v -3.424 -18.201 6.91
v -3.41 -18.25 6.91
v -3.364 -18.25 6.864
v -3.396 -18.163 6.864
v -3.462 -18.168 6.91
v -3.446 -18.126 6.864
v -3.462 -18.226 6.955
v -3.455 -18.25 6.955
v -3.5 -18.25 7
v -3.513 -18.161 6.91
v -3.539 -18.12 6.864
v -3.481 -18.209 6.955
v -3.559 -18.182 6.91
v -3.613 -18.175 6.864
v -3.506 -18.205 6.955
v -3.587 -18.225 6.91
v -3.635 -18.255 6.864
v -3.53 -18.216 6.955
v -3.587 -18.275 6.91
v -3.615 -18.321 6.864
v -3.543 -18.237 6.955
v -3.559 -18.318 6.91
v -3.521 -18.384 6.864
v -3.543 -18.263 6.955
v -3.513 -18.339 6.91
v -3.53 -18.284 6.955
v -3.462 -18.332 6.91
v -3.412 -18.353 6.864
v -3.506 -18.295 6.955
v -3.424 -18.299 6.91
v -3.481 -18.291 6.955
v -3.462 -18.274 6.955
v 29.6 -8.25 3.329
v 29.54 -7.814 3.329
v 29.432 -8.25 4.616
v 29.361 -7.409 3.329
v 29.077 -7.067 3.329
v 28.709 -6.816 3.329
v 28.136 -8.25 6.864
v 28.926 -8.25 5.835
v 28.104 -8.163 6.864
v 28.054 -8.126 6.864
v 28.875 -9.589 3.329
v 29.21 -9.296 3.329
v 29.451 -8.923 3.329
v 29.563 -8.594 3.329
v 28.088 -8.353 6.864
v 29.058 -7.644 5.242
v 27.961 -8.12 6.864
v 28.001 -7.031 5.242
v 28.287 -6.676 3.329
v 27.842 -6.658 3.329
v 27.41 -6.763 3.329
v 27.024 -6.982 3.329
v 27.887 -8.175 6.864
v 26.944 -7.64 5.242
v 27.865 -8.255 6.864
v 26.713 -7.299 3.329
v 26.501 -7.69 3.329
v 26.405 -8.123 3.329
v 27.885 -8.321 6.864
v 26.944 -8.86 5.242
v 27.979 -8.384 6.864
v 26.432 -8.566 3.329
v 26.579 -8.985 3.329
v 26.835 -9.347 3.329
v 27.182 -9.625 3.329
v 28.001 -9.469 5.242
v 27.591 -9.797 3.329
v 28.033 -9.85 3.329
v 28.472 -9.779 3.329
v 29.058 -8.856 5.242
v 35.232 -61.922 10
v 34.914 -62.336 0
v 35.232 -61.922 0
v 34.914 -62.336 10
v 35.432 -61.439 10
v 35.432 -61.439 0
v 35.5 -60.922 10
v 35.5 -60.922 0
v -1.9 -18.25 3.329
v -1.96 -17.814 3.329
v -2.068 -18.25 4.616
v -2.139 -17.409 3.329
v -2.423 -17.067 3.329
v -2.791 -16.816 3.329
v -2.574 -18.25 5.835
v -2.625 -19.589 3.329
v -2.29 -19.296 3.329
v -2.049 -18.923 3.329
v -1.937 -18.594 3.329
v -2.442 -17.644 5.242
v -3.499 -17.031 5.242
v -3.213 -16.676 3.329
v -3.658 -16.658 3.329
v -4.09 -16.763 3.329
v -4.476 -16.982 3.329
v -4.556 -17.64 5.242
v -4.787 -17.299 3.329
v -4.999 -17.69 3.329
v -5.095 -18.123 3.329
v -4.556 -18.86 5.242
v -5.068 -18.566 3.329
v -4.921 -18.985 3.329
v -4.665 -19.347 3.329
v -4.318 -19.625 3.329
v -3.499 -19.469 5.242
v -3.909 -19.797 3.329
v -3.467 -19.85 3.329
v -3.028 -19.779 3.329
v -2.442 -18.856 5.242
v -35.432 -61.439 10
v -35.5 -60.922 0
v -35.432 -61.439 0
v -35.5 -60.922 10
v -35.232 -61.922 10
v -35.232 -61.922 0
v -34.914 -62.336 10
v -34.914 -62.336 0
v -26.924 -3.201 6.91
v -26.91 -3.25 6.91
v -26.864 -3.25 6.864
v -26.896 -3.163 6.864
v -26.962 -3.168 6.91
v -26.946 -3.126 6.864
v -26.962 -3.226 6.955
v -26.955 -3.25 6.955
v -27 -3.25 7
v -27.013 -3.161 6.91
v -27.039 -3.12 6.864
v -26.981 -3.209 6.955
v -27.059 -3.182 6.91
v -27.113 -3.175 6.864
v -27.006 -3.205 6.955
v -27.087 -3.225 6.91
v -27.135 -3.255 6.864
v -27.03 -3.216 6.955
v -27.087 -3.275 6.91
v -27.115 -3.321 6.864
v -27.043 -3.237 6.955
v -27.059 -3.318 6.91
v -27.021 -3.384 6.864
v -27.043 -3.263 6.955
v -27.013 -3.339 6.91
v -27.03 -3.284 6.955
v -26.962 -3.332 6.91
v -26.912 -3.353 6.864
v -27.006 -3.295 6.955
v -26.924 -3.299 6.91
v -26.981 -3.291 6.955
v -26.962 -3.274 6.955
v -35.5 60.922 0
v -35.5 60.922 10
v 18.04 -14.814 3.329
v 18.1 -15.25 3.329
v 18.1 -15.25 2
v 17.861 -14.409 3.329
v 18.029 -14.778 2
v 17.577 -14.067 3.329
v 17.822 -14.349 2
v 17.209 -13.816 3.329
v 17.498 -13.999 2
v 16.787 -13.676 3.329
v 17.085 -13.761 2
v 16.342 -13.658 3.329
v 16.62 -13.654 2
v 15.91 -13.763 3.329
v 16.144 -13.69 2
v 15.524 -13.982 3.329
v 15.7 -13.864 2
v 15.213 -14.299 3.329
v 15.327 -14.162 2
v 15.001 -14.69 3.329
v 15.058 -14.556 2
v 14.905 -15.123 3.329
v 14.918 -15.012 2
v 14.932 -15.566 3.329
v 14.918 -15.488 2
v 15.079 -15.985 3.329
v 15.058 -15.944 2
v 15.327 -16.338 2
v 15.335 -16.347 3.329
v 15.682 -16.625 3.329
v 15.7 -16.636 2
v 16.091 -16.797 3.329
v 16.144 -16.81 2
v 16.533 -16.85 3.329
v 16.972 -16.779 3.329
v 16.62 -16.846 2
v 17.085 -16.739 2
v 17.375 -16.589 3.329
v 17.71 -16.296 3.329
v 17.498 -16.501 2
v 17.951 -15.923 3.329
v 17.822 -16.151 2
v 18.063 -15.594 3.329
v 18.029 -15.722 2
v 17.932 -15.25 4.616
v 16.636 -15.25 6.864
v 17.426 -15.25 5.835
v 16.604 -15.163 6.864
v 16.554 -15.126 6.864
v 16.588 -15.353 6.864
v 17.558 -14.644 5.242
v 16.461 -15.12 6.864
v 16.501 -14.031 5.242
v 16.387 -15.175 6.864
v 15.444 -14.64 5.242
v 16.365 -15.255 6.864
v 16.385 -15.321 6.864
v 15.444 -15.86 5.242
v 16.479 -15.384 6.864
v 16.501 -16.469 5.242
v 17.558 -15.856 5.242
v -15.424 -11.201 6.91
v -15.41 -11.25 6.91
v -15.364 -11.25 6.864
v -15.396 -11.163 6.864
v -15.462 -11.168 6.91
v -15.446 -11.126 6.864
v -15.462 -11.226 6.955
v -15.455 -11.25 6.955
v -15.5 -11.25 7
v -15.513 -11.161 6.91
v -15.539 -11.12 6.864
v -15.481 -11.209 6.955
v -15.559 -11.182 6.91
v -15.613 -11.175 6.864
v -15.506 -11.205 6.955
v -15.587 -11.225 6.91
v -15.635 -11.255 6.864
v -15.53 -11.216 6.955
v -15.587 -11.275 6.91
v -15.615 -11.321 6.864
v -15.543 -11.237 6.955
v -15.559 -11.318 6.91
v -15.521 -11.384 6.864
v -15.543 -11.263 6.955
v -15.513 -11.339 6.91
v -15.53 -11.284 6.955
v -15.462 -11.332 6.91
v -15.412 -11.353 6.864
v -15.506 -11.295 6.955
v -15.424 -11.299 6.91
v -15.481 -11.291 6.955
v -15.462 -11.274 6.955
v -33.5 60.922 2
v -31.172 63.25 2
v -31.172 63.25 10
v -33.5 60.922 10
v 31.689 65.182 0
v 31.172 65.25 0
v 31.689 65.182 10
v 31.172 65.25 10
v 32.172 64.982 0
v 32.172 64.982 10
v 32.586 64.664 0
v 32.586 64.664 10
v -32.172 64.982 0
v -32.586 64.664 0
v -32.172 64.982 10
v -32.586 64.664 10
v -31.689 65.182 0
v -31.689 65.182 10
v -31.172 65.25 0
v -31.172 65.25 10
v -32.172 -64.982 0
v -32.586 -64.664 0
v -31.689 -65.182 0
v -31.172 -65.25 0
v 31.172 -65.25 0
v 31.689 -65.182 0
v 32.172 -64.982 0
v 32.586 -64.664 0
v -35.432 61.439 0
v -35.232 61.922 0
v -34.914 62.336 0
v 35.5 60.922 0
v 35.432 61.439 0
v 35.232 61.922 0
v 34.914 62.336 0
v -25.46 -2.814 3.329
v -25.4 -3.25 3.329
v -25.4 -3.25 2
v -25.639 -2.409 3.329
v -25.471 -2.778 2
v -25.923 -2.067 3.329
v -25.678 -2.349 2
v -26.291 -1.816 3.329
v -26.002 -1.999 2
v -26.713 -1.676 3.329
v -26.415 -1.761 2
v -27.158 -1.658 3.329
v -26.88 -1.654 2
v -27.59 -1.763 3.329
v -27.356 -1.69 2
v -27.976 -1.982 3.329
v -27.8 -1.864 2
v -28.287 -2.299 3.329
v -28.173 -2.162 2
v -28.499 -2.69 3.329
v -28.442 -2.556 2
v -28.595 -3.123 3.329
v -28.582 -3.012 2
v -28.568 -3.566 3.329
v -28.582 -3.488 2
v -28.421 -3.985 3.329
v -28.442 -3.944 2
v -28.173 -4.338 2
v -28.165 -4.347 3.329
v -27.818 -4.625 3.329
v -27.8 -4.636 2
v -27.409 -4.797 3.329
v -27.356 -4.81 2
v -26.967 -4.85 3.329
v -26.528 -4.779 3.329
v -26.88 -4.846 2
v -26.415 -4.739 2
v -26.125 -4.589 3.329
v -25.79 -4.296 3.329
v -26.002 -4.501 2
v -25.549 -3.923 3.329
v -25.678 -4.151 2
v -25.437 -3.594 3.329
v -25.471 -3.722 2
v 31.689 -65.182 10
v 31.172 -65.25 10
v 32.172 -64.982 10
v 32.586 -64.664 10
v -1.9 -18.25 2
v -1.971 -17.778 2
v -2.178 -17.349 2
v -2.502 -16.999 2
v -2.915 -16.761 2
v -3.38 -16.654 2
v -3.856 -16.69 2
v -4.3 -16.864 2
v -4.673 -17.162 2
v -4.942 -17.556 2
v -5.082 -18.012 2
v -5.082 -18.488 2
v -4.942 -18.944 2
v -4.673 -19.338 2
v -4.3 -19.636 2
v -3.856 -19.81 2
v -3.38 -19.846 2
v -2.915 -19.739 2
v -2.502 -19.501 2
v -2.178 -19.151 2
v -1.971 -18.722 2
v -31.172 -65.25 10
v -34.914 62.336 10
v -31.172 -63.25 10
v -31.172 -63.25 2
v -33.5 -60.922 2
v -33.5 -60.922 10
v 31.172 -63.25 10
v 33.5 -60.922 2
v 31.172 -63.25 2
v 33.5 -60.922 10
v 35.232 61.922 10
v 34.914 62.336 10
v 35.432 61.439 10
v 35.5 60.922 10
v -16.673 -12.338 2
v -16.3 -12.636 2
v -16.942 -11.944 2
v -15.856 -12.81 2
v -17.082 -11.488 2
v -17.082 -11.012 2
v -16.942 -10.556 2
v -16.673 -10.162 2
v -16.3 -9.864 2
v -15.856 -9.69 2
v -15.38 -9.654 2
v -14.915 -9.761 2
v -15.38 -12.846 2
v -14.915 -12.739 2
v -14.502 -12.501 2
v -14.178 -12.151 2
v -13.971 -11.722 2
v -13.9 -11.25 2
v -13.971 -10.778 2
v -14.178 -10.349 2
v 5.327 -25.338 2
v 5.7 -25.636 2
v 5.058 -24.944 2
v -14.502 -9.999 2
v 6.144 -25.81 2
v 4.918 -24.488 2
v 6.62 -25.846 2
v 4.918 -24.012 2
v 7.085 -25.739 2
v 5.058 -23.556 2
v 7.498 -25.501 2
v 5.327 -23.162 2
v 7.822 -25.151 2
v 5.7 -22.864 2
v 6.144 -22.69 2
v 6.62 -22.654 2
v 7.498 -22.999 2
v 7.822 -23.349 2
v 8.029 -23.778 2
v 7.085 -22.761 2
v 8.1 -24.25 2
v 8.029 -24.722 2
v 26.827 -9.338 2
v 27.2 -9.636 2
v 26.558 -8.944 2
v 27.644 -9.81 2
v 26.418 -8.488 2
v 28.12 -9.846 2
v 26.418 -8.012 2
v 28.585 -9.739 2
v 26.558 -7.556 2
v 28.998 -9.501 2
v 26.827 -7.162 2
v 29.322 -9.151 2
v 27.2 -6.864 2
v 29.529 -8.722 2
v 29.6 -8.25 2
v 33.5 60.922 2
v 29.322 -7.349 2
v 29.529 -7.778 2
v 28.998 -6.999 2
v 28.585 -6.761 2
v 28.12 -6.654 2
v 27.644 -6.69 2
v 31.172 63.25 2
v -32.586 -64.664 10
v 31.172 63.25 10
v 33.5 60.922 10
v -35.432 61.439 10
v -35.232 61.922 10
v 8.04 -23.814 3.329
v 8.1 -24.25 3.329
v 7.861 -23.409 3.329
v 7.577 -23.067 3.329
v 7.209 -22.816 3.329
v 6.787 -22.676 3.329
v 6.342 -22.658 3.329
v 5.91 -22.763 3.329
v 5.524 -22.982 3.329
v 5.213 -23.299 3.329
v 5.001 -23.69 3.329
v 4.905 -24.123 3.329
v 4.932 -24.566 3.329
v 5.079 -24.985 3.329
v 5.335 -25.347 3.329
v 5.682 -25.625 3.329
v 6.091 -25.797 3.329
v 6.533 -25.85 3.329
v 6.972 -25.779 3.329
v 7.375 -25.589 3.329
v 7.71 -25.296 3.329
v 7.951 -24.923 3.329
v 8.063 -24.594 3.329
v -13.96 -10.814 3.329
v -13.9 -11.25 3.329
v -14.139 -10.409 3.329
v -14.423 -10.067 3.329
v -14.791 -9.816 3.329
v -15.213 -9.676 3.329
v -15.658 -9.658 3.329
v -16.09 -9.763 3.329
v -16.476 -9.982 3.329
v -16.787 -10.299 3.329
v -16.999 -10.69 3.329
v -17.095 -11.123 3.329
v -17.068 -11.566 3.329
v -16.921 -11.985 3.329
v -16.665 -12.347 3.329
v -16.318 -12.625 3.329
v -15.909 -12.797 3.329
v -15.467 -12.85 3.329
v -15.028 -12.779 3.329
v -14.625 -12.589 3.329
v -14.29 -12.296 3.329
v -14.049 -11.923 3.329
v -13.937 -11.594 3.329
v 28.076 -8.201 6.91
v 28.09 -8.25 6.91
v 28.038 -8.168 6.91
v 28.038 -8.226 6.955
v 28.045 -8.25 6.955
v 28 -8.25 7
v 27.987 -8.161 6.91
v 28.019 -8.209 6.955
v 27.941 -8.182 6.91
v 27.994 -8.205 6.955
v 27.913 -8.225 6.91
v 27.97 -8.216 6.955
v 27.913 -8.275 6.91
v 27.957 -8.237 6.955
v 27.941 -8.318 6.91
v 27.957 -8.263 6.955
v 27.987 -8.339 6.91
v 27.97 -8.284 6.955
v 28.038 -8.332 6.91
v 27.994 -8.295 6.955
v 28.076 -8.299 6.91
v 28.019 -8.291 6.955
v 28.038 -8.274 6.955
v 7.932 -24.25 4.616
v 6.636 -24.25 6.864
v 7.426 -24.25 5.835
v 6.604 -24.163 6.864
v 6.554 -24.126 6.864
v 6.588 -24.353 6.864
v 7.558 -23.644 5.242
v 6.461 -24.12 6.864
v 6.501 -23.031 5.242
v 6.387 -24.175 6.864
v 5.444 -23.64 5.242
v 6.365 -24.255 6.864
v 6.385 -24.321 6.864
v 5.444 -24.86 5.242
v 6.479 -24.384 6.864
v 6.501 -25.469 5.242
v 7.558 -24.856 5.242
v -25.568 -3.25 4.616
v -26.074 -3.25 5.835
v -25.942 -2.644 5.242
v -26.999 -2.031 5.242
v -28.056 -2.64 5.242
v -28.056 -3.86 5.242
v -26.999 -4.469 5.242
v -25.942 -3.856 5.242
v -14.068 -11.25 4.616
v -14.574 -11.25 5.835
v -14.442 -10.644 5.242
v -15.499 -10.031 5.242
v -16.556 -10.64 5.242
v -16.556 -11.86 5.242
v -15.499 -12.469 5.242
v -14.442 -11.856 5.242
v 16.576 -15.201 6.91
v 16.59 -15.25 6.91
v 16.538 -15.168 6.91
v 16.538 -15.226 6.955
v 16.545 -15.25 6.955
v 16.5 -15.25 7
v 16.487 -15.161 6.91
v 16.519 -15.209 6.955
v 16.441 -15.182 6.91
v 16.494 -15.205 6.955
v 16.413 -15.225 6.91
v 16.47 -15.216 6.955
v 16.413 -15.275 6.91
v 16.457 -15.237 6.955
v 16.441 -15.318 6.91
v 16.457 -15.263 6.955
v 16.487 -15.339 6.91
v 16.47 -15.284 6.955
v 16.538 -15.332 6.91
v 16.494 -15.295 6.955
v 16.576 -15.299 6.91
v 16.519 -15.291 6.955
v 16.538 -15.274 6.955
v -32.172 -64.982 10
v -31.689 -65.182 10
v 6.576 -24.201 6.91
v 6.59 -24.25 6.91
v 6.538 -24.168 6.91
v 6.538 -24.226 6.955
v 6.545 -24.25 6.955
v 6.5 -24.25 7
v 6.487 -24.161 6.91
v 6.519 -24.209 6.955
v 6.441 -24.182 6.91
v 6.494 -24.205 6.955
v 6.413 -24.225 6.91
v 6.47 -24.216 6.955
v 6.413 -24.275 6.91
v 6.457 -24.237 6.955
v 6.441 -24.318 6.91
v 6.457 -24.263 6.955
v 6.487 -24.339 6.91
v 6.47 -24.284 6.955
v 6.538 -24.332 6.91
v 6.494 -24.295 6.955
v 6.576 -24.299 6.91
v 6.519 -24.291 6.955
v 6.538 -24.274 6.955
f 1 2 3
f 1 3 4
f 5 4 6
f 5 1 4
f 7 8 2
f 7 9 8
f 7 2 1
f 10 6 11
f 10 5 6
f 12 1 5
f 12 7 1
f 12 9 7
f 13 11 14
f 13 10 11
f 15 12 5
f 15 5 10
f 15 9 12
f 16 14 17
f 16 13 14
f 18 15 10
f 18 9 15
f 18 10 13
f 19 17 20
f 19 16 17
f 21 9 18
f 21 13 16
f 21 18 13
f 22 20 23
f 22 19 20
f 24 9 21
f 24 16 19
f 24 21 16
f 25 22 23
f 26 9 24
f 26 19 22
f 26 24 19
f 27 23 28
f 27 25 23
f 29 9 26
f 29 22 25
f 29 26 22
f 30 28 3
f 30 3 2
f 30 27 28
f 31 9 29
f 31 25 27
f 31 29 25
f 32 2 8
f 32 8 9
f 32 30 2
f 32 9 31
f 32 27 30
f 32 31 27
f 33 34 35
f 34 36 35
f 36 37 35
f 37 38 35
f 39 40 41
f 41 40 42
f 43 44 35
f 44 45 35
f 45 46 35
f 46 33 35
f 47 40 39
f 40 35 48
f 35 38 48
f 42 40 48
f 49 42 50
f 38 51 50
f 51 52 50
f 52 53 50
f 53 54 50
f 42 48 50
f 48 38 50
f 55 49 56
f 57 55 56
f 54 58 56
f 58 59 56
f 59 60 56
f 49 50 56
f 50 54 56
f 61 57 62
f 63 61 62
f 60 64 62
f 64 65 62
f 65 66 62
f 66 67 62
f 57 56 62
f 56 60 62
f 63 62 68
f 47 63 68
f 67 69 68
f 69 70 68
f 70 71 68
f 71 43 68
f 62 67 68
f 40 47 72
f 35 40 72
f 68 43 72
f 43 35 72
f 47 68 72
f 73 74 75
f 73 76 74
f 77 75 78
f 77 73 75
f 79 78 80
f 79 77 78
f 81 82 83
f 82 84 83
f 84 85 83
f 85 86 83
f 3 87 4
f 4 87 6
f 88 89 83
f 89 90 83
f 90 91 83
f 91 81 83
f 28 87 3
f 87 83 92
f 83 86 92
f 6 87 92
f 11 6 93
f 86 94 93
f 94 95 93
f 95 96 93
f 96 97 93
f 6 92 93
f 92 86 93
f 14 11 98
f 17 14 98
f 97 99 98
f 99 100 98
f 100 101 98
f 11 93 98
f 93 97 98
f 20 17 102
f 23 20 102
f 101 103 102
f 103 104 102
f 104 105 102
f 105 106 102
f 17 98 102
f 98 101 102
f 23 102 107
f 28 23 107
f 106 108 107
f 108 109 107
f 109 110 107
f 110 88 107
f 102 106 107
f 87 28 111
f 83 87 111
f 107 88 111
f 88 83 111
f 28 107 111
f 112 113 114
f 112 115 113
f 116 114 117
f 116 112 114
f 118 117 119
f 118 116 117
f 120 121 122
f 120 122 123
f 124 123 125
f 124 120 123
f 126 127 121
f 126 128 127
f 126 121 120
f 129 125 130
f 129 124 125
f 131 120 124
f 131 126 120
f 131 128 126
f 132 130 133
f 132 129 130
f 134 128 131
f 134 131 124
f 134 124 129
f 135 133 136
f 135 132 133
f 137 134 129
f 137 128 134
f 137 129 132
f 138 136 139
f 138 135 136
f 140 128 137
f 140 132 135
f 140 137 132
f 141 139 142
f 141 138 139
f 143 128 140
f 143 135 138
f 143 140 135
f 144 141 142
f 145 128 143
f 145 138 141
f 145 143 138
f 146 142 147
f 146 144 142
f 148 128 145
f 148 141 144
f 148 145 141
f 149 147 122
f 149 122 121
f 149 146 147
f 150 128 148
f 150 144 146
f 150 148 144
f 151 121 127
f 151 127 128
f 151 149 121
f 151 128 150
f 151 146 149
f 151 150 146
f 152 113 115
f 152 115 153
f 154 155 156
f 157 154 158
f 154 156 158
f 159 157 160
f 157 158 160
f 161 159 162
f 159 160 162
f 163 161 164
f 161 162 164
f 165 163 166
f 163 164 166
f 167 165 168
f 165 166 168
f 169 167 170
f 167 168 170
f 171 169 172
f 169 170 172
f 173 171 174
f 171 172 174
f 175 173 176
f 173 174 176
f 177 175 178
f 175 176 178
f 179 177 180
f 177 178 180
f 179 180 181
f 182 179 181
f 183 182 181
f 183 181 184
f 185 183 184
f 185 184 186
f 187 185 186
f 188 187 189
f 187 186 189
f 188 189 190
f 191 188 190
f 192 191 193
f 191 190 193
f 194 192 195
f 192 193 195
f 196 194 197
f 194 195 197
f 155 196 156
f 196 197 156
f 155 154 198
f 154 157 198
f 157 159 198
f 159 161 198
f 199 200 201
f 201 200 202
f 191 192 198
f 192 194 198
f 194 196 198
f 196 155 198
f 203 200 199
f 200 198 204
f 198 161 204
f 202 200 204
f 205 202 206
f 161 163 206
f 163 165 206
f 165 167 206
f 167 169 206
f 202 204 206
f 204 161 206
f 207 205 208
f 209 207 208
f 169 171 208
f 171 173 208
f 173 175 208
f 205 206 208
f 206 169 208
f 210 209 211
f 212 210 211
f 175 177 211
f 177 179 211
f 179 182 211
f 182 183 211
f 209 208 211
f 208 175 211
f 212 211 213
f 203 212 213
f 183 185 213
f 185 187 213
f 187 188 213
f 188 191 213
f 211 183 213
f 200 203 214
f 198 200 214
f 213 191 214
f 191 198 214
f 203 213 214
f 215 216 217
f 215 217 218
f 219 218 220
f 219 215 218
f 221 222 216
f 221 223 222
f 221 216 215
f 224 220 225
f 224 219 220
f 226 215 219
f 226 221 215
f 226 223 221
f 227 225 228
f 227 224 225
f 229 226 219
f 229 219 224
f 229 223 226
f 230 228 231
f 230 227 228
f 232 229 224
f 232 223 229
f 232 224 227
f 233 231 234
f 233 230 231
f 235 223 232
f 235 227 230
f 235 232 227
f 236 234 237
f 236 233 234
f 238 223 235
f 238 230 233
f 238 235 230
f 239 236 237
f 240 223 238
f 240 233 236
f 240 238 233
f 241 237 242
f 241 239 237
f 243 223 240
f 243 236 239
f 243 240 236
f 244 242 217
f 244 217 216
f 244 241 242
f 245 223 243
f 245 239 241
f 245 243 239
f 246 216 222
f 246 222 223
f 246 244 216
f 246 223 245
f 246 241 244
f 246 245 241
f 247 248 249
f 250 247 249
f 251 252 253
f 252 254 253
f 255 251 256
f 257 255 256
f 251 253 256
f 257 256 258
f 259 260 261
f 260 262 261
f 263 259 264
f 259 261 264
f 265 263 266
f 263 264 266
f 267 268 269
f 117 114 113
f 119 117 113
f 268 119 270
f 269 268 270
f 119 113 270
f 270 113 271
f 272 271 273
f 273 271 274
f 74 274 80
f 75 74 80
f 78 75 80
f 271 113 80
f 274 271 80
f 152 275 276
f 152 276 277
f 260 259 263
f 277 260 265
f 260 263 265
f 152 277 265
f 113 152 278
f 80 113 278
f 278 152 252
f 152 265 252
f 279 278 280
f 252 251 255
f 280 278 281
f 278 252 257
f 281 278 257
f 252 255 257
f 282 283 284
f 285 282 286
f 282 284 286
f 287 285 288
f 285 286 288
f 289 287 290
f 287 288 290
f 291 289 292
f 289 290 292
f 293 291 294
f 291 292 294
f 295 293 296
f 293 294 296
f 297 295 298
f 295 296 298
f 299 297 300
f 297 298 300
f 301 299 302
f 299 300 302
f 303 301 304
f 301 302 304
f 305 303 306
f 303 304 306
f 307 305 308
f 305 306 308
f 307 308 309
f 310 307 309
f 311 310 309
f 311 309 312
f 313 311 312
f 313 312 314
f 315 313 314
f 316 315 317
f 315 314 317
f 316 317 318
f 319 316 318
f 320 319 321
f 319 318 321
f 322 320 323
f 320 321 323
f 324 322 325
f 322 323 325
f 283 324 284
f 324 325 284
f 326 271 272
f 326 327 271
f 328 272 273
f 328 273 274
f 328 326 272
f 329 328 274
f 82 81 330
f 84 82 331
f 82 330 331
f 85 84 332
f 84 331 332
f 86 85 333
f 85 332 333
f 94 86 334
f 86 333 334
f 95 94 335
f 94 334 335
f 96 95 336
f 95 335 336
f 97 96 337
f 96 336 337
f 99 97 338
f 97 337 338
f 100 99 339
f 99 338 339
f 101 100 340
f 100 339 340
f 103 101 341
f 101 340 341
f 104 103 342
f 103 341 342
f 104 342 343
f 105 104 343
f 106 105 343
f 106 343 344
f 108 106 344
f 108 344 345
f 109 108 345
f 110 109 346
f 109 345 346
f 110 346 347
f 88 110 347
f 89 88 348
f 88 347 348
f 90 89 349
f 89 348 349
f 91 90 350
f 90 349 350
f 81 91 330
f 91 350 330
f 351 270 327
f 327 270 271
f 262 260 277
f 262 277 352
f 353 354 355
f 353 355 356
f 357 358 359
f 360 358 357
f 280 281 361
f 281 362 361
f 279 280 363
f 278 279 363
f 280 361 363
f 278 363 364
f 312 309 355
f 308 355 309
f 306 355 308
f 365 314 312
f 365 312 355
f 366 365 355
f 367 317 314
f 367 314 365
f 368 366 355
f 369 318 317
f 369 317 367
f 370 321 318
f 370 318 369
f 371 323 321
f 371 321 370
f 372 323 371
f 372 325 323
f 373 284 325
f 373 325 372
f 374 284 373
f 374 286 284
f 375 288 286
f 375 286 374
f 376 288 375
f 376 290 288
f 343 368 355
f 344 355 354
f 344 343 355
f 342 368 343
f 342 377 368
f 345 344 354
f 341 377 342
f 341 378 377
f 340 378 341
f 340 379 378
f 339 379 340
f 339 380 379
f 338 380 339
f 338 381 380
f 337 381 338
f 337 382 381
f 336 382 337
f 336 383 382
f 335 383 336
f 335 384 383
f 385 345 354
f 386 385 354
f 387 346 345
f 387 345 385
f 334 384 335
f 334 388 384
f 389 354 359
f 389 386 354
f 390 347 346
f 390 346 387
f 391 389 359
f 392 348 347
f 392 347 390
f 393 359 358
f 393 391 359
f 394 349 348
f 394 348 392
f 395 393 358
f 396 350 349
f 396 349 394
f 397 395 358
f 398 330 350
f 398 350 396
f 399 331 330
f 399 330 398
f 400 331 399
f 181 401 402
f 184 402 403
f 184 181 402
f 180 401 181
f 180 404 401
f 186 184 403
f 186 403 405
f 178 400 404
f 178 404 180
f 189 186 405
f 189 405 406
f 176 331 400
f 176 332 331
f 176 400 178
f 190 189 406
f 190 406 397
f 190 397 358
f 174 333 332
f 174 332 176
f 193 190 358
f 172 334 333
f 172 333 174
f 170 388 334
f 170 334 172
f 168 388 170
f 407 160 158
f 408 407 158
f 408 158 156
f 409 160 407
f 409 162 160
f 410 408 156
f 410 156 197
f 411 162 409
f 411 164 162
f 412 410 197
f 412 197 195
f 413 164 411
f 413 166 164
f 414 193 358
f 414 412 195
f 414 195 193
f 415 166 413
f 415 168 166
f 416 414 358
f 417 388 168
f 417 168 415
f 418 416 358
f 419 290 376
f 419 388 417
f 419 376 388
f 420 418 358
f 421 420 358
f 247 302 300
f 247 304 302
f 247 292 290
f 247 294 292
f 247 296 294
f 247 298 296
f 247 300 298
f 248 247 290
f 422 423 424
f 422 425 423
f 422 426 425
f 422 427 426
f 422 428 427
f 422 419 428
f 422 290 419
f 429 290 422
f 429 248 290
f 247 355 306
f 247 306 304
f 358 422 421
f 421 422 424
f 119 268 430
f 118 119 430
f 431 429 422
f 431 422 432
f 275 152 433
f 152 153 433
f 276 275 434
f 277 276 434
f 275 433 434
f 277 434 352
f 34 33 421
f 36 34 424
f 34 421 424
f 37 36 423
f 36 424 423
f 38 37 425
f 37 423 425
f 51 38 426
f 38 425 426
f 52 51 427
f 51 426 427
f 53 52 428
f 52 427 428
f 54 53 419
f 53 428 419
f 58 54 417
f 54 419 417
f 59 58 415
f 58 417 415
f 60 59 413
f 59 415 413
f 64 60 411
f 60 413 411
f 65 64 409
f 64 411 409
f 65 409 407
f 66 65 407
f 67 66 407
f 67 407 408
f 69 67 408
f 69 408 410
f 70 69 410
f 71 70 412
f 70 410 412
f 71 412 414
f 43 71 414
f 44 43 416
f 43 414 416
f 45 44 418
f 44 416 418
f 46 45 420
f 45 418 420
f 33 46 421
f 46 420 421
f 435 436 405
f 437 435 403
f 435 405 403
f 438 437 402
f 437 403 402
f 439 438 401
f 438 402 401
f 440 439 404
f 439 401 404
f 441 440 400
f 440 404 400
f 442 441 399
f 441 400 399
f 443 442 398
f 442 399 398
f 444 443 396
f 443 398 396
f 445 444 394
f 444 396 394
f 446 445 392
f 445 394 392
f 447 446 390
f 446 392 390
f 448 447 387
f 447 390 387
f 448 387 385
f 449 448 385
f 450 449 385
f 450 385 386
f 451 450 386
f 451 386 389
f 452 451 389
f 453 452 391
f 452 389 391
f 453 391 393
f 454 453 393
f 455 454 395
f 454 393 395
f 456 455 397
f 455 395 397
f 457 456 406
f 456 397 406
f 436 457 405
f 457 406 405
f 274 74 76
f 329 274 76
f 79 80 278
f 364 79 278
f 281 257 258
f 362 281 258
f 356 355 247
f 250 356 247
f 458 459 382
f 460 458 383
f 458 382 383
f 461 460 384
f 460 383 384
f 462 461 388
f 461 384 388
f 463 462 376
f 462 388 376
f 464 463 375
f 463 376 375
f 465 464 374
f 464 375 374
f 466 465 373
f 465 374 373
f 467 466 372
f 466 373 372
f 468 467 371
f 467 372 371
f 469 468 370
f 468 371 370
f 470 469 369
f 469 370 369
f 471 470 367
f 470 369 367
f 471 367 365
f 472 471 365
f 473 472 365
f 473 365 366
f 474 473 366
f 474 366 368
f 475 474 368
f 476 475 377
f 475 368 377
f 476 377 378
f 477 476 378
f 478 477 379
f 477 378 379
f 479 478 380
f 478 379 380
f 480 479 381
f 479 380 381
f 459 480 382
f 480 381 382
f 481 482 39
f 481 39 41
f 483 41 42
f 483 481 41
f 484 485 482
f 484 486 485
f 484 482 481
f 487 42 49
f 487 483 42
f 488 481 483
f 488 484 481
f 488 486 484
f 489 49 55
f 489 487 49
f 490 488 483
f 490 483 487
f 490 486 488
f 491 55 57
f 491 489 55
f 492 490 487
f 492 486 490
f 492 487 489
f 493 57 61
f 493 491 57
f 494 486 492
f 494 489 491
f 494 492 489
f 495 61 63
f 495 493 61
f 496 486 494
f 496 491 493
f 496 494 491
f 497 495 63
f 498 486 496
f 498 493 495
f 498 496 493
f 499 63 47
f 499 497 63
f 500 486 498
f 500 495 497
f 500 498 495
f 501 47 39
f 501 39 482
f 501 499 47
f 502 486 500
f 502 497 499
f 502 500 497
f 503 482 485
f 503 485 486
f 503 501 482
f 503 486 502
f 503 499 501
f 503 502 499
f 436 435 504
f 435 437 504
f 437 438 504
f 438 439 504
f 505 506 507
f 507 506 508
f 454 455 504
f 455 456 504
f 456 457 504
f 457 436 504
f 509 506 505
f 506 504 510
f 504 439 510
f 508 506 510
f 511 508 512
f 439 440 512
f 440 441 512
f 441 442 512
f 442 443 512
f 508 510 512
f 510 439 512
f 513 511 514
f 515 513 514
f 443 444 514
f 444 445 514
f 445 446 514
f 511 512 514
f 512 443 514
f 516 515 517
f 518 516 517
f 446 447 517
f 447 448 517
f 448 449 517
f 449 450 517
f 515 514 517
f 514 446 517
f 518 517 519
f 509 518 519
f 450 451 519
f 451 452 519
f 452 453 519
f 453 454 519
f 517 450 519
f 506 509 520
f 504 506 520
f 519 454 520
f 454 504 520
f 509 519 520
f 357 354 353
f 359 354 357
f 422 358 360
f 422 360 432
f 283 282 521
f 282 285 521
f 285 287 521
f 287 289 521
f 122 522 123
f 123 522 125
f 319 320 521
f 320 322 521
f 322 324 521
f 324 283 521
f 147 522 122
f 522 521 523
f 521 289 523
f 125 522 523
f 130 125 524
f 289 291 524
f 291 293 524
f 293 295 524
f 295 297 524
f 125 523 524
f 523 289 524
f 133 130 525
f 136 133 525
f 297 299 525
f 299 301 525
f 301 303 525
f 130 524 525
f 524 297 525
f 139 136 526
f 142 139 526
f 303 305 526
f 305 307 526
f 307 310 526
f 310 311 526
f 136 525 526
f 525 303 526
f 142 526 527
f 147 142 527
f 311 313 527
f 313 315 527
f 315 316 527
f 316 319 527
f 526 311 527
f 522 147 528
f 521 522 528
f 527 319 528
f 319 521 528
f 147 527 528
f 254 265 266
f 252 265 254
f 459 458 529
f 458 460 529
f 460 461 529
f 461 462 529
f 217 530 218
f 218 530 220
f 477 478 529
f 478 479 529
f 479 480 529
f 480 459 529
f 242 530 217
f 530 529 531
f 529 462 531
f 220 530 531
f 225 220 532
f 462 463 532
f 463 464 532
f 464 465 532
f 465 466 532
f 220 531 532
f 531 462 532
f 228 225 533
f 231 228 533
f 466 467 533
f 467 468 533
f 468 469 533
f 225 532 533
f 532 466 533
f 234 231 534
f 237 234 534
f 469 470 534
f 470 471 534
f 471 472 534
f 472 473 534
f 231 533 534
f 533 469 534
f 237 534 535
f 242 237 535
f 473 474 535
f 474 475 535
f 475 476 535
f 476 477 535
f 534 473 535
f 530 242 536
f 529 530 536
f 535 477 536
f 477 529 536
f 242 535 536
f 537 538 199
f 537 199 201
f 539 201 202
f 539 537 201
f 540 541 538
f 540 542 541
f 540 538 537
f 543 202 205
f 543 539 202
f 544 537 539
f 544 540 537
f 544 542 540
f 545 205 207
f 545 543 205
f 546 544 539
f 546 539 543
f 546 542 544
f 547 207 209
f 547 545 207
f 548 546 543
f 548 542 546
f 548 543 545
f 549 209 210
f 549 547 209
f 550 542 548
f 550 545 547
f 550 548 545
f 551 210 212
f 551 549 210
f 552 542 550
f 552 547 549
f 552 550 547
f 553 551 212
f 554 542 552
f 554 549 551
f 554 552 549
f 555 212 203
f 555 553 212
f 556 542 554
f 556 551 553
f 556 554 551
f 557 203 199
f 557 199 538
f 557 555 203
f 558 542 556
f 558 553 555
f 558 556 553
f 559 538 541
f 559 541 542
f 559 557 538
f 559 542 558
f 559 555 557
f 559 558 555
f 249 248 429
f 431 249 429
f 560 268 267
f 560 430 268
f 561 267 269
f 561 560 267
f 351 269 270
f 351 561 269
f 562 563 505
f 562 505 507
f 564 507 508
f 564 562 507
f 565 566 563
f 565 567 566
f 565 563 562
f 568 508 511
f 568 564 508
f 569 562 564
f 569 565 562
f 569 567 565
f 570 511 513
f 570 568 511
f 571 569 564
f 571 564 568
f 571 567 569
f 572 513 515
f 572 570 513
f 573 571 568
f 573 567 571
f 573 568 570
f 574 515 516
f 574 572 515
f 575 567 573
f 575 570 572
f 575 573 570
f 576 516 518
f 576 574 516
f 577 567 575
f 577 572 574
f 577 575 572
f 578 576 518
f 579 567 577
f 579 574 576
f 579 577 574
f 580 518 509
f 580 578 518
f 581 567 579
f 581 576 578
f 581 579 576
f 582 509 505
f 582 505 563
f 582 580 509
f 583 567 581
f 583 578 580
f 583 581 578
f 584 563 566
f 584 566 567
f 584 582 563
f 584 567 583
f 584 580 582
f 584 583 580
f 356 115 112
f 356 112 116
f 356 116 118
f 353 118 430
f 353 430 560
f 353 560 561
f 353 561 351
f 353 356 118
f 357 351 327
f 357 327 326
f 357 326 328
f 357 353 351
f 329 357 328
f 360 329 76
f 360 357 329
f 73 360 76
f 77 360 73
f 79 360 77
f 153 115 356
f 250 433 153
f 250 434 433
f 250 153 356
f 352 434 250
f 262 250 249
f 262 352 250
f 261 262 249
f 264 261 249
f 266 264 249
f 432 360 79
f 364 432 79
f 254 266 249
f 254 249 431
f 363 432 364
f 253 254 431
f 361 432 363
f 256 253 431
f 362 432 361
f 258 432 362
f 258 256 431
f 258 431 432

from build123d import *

# Parameters (mm, degrees)
F0_W     = 71
F0_H     = 130.5
F1_DEPTH = 10
F2_SIZE  = 3.5
F3_R     = 2
F4_T     = 2
F5_R     = 1.6
F6_DEPTH = 5
F7_SIZE  = 1.6
F8_R     = 5


# Not quite as in the source:
# - a shell that OpenCascade refuses in one call is made with other operations: the cavity is built on its own and cut out


with BuildPart() as f1:
    # F0 (on Top) → F1 (new body)
    with BuildSketch(Plane.XY):
        Rectangle(F0_W, F0_H)
    extrude(amount=F1_DEPTH)

    # F2
    f2_edges = [f1.edges().sort_by_distance(p)[0] for p in [
        (-35.5, -65.25, 5),
        (35.5, -65.25, 5),
        (-35.5, 65.25, 5),
        (35.5, 65.25, 5),
    ]]
    chamfer(f2_edges, length=F2_SIZE)

    # F3
    f3_edges = [f1.edges().sort_by_distance(p)[0] for p in [
        (-32, 65.25, 5),
        (-35.5, 61.75, 5),
        (32, 65.25, 5),
        (35.5, 61.75, 5),
        (32, -65.25, 5),
        (35.5, -61.75, 5),
        (-35.5, -61.75, 5),
        (-32, -65.25, 5),
    ]]
    fillet(f3_edges, radius=F3_R)

    # F4: shell of thickness 2, made by hand


with BuildPart() as f4_core1:
    # F4_t2: copy of F1
    add(f1.part)

    # the walls: a layer under each face that stays
    f4_faces = [f4_core1.faces().sort_by_distance(p)[0] for p in [
        (0, -65.25, 5),
        (0, 0, 0),
        (-33.75, -63.5, 5),
        (33.75, -63.5, 5),
        (-35.5, 0, 5),
        (35.5, 0, 5),
        (-33.75, 63.5, 5),
        (33.75, 63.5, 5),
        (0, 65.25, 5),
    ]]
    thicken(f4_faces, amount=-F4_T, mode=Mode.SUBTRACT)


with BuildPart() as f1_1:
    add(f1.part)

    # what is left inside the walls is the cavity
    f4_cavity = [f4_core1.part.solids().sort_by_distance(p)[0] for p in [
        (0, -21.083333, 2.02),
    ]]
    add(f4_cavity, mode=Mode.SUBTRACT)

    # F5 (on face) → F6 (join)
    with BuildSketch(Plane.XY.offset(2)):
        with Locations((-27, -3.25)):
            Circle(F5_R)
        with Locations((-15.5, -11.25)):
            Circle(F5_R)
        with Locations((-3.5, -18.25)):
            Circle(F5_R)
        with Locations((6.5, -24.25)):
            Circle(F5_R)
        with Locations((16.5, -15.25)):
            Circle(F5_R)
        with Locations((28, -8.25)):
            Circle(F5_R)
    extrude(amount=F6_DEPTH)

    # F7
    f7_edges = [f1_1.edges().sort_by_distance(p)[0] for p in [
        (-28.6, -3.25, 7),
        (-17.1, -11.25, 7),
        (-5.1, -18.25, 7),
        (4.9, -24.25, 7),
        (14.9, -15.25, 7),
        (26.4, -8.25, 7),
    ]]
    chamfer(f7_edges, length=F7_SIZE)

    # F8
    f8_edges = [f1_1.edges().sort_by_distance(p)[0] for p in [
        (-28.6, -3.25, 5.4),
        (-17.1, -11.25, 5.4),
        (-5.1, -18.25, 5.4),
        (4.9, -24.25, 5.4),
        (14.9, -15.25, 5.4),
        (26.4, -8.25, 5.4),
    ]]
    fillet(f8_edges, radius=F8_R)


solid = f1_1.part
